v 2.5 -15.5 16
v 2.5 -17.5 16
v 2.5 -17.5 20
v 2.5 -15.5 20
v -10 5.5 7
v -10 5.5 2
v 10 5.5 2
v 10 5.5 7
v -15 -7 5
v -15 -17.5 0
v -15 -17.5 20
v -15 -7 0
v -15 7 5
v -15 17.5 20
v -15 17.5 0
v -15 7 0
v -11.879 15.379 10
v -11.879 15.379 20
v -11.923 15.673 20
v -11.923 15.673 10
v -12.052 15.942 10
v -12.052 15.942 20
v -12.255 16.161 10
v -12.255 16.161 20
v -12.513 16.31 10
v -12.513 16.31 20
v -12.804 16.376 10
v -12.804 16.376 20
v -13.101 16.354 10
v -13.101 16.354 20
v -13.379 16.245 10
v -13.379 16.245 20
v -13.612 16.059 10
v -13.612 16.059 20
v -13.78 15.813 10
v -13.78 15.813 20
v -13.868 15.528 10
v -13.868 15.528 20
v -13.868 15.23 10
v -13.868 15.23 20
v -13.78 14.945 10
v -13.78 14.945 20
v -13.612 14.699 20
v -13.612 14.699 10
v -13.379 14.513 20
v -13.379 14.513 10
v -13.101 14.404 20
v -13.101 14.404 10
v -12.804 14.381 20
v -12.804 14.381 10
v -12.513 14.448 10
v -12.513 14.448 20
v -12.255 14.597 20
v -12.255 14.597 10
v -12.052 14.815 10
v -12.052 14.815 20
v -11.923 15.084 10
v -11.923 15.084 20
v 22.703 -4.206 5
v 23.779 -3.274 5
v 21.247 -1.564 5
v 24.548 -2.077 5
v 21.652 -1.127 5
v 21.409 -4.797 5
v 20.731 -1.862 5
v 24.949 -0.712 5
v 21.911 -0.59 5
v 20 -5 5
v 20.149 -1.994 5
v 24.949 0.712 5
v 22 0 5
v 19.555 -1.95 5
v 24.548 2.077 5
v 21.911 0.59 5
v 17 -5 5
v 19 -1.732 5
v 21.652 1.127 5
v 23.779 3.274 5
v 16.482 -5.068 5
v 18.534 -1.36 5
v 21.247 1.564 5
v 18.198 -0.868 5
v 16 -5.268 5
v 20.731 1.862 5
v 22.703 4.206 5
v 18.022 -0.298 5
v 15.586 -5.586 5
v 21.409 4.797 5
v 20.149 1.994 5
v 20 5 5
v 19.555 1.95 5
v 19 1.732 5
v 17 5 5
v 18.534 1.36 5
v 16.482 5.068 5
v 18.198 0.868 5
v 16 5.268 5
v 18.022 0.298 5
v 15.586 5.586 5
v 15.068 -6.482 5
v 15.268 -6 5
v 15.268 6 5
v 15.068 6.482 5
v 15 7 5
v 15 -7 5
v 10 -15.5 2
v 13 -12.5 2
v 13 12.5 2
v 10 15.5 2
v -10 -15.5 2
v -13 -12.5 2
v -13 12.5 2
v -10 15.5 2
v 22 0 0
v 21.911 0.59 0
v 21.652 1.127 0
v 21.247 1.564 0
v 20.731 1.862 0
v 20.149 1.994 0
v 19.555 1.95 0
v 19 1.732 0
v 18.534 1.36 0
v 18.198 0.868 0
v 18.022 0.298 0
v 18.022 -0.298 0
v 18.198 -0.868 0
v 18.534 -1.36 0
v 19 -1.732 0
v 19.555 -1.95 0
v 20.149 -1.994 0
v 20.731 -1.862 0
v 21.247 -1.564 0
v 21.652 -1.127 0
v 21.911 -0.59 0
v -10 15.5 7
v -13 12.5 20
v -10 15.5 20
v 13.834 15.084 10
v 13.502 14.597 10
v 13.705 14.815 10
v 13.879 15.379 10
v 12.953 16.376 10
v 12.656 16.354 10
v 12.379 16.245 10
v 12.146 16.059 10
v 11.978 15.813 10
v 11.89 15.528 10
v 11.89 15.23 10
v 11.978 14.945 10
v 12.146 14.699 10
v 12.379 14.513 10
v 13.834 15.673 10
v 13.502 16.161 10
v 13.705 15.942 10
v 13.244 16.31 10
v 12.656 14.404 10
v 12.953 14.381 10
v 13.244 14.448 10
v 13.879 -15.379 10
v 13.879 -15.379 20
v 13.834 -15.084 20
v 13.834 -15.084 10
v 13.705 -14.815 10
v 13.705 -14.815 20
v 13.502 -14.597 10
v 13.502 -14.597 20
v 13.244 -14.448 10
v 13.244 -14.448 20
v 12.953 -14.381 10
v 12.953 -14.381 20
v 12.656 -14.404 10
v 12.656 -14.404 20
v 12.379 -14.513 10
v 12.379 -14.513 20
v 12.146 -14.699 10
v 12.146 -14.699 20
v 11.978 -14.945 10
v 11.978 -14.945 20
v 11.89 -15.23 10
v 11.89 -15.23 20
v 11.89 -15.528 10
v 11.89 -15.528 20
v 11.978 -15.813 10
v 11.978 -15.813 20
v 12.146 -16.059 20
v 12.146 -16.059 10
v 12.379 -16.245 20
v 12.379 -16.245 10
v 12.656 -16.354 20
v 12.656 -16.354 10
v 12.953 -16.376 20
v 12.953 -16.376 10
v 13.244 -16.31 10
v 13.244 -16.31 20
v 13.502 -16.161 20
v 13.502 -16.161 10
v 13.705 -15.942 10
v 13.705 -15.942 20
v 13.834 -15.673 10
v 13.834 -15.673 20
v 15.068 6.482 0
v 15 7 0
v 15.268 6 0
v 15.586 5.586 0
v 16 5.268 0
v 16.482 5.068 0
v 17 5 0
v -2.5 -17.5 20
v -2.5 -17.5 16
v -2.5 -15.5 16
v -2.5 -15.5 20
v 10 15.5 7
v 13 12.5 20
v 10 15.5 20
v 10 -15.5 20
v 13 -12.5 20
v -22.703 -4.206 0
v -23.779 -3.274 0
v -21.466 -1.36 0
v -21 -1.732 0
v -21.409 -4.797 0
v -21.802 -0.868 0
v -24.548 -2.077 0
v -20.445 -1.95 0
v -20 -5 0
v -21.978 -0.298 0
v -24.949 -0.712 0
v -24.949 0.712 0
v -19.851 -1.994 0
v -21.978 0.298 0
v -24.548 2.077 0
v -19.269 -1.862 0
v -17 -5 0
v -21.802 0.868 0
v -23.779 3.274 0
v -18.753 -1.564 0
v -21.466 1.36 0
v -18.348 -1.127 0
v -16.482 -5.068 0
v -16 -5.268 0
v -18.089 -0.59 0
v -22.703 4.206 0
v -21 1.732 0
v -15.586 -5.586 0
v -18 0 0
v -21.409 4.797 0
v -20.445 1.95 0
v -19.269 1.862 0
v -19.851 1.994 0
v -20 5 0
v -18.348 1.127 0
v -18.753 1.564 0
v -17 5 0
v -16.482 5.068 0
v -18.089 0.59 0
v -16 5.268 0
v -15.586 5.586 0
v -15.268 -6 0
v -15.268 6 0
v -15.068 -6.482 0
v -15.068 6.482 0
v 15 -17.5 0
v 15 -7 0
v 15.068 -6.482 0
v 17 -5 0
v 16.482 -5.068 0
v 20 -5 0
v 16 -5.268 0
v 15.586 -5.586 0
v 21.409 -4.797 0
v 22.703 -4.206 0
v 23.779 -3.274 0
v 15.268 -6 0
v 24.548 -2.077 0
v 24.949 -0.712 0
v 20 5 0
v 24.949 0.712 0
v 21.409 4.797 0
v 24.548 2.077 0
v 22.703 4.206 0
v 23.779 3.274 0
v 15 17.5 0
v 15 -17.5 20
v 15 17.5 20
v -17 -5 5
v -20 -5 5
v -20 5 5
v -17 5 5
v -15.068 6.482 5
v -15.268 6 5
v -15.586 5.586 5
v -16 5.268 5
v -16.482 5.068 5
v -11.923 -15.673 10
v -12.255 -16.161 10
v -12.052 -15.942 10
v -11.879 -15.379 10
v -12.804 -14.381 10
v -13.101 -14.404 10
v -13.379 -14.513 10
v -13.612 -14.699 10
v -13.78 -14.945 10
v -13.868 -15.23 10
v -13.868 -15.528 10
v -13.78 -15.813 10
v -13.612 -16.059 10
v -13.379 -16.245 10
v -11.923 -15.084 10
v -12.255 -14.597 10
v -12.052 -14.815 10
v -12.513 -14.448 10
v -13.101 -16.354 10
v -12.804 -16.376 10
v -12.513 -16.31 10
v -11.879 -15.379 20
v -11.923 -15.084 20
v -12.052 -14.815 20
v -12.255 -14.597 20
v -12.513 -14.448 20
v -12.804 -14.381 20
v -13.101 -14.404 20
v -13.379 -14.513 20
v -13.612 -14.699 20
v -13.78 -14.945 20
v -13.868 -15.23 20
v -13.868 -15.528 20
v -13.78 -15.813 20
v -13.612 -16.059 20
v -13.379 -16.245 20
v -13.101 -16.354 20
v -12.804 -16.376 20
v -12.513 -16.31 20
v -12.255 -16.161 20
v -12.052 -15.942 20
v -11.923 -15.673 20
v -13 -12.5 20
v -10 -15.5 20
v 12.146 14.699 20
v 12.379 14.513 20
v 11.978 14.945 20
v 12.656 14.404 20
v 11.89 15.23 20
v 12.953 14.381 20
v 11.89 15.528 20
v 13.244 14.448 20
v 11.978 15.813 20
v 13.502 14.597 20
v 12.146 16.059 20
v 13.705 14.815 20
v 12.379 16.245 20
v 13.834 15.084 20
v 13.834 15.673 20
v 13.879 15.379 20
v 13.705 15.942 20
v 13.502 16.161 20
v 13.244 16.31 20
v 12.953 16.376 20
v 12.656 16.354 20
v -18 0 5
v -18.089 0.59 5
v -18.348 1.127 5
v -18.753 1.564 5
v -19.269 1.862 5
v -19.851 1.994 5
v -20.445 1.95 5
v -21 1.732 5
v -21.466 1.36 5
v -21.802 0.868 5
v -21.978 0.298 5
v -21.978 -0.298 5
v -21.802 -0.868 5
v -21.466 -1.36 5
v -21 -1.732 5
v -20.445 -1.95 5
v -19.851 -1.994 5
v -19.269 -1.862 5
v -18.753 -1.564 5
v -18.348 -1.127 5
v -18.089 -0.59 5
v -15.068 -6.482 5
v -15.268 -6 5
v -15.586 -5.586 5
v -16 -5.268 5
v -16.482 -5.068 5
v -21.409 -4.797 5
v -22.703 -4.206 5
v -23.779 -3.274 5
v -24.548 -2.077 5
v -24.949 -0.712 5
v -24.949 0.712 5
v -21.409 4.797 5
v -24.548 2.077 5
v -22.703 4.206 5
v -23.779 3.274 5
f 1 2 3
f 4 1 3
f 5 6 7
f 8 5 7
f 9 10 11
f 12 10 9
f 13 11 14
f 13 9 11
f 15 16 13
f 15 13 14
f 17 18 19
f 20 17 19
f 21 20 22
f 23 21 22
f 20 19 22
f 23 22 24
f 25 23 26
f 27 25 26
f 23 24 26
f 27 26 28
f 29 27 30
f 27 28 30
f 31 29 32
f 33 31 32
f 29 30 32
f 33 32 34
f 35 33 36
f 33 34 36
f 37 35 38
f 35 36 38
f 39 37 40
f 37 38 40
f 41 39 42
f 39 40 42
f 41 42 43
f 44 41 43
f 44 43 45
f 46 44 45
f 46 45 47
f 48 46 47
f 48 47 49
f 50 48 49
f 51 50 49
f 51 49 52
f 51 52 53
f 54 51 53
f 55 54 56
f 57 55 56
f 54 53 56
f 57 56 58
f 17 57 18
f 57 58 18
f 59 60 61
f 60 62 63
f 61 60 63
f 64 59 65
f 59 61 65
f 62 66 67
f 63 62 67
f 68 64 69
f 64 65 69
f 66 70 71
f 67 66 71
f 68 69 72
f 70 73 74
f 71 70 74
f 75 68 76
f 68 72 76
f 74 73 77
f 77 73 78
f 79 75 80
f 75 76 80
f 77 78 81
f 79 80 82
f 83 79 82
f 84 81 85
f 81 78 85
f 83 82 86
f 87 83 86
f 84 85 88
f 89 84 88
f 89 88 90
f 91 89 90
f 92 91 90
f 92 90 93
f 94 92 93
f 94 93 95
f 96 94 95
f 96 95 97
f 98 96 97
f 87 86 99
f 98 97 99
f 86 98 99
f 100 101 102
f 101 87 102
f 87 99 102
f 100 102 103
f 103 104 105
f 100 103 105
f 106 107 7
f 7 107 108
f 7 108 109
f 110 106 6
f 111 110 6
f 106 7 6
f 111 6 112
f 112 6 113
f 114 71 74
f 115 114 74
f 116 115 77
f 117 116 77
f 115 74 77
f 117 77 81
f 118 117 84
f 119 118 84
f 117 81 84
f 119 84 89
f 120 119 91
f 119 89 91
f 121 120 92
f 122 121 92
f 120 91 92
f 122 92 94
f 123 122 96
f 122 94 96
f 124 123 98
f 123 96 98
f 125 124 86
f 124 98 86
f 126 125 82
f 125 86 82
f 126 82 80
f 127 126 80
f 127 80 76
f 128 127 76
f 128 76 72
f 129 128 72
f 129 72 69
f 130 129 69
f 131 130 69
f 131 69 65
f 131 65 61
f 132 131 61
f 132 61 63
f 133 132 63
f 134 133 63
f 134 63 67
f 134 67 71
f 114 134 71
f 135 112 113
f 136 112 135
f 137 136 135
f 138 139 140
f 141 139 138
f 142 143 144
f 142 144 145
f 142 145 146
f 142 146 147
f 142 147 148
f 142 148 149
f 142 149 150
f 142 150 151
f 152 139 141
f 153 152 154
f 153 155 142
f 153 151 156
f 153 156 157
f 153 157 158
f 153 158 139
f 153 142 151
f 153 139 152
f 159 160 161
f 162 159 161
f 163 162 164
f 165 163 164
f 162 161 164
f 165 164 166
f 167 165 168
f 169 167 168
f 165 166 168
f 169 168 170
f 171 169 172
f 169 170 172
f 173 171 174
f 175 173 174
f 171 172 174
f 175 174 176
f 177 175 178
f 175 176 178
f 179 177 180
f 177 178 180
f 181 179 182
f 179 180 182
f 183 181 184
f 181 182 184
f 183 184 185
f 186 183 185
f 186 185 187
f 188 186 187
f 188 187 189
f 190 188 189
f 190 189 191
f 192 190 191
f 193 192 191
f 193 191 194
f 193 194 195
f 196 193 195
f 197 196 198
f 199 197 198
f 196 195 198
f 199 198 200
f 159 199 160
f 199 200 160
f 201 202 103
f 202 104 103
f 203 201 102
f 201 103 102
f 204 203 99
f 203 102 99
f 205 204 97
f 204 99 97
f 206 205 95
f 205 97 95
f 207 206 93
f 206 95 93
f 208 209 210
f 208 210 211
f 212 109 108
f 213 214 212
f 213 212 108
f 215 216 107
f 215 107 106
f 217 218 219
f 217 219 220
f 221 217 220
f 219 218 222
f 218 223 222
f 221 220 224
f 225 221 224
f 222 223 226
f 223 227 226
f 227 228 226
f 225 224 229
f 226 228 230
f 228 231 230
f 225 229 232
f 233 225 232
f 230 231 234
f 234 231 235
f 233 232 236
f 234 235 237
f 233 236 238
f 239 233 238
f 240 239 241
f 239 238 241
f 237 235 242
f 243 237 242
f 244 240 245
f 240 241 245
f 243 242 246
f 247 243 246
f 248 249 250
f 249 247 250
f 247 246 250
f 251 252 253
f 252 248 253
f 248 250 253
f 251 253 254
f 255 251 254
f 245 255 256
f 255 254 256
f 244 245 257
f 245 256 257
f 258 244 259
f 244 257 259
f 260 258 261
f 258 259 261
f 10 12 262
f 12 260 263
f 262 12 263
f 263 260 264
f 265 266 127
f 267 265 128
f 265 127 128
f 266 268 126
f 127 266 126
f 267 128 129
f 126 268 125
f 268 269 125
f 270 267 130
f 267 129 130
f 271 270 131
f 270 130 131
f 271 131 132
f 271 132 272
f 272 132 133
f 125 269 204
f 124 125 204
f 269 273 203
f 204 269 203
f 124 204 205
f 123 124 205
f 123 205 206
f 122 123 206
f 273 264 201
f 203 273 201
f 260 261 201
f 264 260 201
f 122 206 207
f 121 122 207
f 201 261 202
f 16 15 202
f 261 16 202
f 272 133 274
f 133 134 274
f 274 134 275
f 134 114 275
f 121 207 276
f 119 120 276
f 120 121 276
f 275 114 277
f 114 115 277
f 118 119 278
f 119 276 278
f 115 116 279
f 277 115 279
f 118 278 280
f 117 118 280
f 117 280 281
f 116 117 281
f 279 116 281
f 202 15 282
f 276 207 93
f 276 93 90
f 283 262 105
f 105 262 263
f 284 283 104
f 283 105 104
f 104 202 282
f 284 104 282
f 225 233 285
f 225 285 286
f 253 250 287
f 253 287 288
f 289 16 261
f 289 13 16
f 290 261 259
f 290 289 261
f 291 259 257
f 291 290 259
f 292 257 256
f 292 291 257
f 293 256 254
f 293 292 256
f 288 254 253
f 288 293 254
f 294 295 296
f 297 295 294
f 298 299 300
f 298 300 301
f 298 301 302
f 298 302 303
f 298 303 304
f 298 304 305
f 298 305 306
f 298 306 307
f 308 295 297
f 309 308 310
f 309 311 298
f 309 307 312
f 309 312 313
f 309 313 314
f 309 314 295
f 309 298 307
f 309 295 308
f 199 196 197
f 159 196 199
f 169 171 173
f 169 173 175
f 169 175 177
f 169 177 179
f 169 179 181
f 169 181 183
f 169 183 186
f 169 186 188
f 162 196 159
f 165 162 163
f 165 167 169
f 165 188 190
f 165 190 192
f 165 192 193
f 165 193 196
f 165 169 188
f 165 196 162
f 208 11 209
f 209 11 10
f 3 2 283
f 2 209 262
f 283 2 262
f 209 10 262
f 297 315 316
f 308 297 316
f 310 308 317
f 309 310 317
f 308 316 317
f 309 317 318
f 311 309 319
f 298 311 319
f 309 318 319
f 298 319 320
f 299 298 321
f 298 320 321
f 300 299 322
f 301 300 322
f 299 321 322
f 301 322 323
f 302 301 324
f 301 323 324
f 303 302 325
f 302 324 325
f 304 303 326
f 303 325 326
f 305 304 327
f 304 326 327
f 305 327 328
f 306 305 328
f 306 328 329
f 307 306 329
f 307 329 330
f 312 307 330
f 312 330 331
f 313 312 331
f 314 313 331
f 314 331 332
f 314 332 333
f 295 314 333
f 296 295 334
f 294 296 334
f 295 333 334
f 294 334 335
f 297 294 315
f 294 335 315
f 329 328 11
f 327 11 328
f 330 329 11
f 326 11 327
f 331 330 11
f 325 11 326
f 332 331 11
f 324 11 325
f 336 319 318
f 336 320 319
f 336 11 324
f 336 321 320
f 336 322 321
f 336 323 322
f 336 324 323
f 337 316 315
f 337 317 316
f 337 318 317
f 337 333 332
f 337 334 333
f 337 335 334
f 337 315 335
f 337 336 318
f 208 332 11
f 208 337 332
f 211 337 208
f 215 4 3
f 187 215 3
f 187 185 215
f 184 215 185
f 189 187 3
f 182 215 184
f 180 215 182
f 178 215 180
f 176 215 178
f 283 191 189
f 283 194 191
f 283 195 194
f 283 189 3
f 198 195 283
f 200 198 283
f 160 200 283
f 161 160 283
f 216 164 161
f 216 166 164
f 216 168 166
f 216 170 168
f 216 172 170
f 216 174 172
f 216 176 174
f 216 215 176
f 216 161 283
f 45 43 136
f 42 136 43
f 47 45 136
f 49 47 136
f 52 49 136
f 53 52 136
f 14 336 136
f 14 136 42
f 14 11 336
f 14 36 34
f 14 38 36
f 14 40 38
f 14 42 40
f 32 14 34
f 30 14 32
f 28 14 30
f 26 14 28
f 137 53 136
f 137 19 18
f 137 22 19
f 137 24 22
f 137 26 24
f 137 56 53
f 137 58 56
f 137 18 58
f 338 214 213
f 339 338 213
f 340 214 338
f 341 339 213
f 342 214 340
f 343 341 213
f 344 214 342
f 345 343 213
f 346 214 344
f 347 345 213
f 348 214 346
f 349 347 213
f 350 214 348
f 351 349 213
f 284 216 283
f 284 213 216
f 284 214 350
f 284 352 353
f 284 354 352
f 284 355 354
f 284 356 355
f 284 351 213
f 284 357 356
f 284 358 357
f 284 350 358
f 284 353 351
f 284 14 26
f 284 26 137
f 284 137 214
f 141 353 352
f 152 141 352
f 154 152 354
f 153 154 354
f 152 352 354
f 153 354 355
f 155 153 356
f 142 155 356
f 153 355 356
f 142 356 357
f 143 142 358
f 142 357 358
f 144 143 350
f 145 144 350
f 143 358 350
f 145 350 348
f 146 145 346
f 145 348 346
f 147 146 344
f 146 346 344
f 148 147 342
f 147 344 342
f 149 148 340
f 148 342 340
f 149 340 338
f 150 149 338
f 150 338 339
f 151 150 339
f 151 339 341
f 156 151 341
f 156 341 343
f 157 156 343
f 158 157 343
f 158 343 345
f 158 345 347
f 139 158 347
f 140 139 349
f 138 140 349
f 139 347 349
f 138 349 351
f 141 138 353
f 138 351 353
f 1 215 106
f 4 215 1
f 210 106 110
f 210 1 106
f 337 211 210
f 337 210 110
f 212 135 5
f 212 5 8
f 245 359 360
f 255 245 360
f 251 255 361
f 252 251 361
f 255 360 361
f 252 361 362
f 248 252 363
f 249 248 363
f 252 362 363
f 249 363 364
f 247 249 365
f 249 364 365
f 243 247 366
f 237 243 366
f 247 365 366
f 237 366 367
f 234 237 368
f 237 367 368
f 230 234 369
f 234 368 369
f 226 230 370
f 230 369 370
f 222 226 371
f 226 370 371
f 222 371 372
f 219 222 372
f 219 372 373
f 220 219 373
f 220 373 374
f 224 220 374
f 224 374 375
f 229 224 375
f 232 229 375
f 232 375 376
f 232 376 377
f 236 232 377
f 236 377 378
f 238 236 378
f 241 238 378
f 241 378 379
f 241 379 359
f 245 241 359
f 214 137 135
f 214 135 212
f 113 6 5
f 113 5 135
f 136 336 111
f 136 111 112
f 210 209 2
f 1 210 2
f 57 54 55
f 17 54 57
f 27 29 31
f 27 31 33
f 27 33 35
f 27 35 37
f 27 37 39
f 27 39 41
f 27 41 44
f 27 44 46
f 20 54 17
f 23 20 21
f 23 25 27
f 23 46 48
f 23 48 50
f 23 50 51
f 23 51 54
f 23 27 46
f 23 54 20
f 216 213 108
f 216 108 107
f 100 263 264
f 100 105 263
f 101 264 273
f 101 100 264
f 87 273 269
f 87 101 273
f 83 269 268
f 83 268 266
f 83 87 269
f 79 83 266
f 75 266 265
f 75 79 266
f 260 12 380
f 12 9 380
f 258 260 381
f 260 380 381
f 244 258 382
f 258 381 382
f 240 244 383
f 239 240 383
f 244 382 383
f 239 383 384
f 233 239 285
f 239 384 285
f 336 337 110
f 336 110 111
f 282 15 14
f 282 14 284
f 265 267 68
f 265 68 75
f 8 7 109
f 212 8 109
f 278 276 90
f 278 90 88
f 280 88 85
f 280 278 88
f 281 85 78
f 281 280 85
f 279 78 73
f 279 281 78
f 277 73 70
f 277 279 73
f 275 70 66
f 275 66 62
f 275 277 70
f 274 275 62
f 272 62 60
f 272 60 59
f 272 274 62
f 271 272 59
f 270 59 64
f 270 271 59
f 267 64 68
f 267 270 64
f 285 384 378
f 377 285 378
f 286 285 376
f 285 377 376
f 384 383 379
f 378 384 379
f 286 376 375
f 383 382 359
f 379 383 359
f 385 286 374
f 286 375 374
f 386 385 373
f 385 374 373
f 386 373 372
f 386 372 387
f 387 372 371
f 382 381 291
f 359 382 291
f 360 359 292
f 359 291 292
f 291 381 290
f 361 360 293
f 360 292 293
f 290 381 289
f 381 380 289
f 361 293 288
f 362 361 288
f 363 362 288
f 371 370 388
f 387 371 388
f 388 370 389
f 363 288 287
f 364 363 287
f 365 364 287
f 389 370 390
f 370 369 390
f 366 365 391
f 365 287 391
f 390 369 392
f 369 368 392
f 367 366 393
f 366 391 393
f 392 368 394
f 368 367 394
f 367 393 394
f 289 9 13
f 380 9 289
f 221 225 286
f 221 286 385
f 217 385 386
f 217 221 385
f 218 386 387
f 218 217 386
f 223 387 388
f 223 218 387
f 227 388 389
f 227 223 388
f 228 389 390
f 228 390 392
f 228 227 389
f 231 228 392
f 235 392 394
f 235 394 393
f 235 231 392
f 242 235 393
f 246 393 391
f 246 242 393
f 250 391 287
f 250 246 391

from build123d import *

# Parameters (mm, degrees)
ESQUISSE1_W             = 30
ESQUISSE1_H             = 35
BOSS_EXTRU_1_DEPTH      = 20
ENL_V_MAT_EXTRU_1_DEPTH = 18
BOSS_EXTRU_2_DEPTH      = 5
ENL_V_MAT_EXTRU_2_REACH = 7
ESQUISSE4_R             = 2
ESQUISSE5_W             = 20
ESQUISSE5_H             = 10
BOSS_EXTRU_3_DEPTH      = 5
ENL_V_MAT_EXTRU_3_REACH = 37
ESQUISSE6_W             = 5
ESQUISSE6_H             = 4
CONG_1_R                = 2
ESQUISSE7_R             = 1
ENL_V_MAT_EXTRU_4_DEPTH = 10


with BuildPart() as part:
    # Esquisse1 → Boss.-Extru.1 (new body)
    with BuildSketch(Plane.XY):
        Rectangle(ESQUISSE1_W, ESQUISSE1_H)
    extrude(amount=BOSS_EXTRU_1_DEPTH)

    # Esquisse2 → Enlèv. mat.-Extru.1 (cut)
    with BuildSketch(Plane.XY.offset(20)):
        Polygon((-10, 15.5), (10, 15.5), (13, 12.5), (13, -12.5), (10, -15.5), (-10, -15.5), (-13, -12.5), (-13, 12.5), align=None)
    extrude(amount=-ENL_V_MAT_EXTRU_1_DEPTH, mode=Mode.SUBTRACT)

    # Esquisse3 → Boss.-Extru.2 (add)
    with BuildSketch(Plane(origin=(0, 0, 0), x_dir=(-1, 0, 0), z_dir=(0, 0, -1))):
        with BuildLine():
            Line((-15, 5), (-20, 5))
            ThreePointArc((-20, 5), (-25, 0), (-20, -5))
            Line((-20, -5), (-15, -5))
            Line((-15, -5), (-15, 5))
        make_face()
        with BuildLine():
            Line((15, 5), (15, -5))
            Line((15, -5), (20, -5))
            ThreePointArc((20, -5), (25, 0), (20, 5))
            Line((20, 5), (15, 5))
        make_face()
    extrude(amount=-BOSS_EXTRU_2_DEPTH)

    # Esquisse4 → Enlèv. mat.-Extru.2 (cut, up to next)
    with BuildSketch(Plane.XY.offset(5), mode=Mode.PRIVATE) as enl_v_mat_extru_2_sk1:
        with Locations((-20, 0)):
            Circle(ESQUISSE4_R)
    enl_v_mat_extru_2_tool1 = extrude(enl_v_mat_extru_2_sk1.sketch, amount=-ENL_V_MAT_EXTRU_2_REACH, mode=Mode.PRIVATE) & part.part
    add(enl_v_mat_extru_2_tool1.solids().sort_by_distance((-20, 0, 5))[0], mode=Mode.SUBTRACT)
    # Esquisse4 → Enlèv. mat.-Extru.2 (cut, up to next)
    with BuildSketch(Plane.XY.offset(5), mode=Mode.PRIVATE) as enl_v_mat_extru_2_sk2:
        with Locations((20, 0)):
            Circle(ESQUISSE4_R)
    enl_v_mat_extru_2_tool2 = extrude(enl_v_mat_extru_2_sk2.sketch, amount=-ENL_V_MAT_EXTRU_2_REACH, mode=Mode.PRIVATE) & part.part
    add(enl_v_mat_extru_2_tool2.solids().sort_by_distance((20, 0, 5))[0], mode=Mode.SUBTRACT)

    # Esquisse5 → Boss.-Extru.3 (add)
    with BuildSketch(Plane.XY.offset(2)):
        with Locations((0, 10.5)):
            Rectangle(ESQUISSE5_W, ESQUISSE5_H)
    extrude(amount=BOSS_EXTRU_3_DEPTH)

    # Esquisse6 → Enlèv. mat.-Extru.3 (cut, up to next)
    with BuildSketch(Plane.XZ.offset(17.5), mode=Mode.PRIVATE) as enl_v_mat_extru_3_sk1:
        with Locations((0, 18)):
            Rectangle(ESQUISSE6_W, ESQUISSE6_H)
    enl_v_mat_extru_3_tool1 = extrude(enl_v_mat_extru_3_sk1.sketch, amount=-ENL_V_MAT_EXTRU_3_REACH, mode=Mode.PRIVATE) & part.part
    add(enl_v_mat_extru_3_tool1.solids().sort_by_distance((0, -17.5, 18))[0], mode=Mode.SUBTRACT)

    # Congé1
    cong_1_edges = [part.edges().sort_by_distance(p)[0] for p in [
        (15, -5, 2.5),
        (15, 5, 2.5),
        (-15, 5, 2.5),
        (-15, -5, 2.5),
    ]]
    fillet(cong_1_edges, radius=CONG_1_R)

    # Esquisse7 → Enlèv. mat.-Extru.4 (cut)
    with BuildSketch(Plane.XY.offset(20)):
        with Locations((-12.878679656, 15.378679656)):
            Circle(ESQUISSE7_R)
        with Locations((-12.878679656, -15.378679656)):
            Circle(ESQUISSE7_R)
        with Locations((12.878679656, -15.378679656)):
            Circle(ESQUISSE7_R)
        with Locations((12.878679656, 15.378679656)):
            Circle(ESQUISSE7_R)
    extrude(amount=-ENL_V_MAT_EXTRU_4_DEPTH, mode=Mode.SUBTRACT)


solid = part.part
